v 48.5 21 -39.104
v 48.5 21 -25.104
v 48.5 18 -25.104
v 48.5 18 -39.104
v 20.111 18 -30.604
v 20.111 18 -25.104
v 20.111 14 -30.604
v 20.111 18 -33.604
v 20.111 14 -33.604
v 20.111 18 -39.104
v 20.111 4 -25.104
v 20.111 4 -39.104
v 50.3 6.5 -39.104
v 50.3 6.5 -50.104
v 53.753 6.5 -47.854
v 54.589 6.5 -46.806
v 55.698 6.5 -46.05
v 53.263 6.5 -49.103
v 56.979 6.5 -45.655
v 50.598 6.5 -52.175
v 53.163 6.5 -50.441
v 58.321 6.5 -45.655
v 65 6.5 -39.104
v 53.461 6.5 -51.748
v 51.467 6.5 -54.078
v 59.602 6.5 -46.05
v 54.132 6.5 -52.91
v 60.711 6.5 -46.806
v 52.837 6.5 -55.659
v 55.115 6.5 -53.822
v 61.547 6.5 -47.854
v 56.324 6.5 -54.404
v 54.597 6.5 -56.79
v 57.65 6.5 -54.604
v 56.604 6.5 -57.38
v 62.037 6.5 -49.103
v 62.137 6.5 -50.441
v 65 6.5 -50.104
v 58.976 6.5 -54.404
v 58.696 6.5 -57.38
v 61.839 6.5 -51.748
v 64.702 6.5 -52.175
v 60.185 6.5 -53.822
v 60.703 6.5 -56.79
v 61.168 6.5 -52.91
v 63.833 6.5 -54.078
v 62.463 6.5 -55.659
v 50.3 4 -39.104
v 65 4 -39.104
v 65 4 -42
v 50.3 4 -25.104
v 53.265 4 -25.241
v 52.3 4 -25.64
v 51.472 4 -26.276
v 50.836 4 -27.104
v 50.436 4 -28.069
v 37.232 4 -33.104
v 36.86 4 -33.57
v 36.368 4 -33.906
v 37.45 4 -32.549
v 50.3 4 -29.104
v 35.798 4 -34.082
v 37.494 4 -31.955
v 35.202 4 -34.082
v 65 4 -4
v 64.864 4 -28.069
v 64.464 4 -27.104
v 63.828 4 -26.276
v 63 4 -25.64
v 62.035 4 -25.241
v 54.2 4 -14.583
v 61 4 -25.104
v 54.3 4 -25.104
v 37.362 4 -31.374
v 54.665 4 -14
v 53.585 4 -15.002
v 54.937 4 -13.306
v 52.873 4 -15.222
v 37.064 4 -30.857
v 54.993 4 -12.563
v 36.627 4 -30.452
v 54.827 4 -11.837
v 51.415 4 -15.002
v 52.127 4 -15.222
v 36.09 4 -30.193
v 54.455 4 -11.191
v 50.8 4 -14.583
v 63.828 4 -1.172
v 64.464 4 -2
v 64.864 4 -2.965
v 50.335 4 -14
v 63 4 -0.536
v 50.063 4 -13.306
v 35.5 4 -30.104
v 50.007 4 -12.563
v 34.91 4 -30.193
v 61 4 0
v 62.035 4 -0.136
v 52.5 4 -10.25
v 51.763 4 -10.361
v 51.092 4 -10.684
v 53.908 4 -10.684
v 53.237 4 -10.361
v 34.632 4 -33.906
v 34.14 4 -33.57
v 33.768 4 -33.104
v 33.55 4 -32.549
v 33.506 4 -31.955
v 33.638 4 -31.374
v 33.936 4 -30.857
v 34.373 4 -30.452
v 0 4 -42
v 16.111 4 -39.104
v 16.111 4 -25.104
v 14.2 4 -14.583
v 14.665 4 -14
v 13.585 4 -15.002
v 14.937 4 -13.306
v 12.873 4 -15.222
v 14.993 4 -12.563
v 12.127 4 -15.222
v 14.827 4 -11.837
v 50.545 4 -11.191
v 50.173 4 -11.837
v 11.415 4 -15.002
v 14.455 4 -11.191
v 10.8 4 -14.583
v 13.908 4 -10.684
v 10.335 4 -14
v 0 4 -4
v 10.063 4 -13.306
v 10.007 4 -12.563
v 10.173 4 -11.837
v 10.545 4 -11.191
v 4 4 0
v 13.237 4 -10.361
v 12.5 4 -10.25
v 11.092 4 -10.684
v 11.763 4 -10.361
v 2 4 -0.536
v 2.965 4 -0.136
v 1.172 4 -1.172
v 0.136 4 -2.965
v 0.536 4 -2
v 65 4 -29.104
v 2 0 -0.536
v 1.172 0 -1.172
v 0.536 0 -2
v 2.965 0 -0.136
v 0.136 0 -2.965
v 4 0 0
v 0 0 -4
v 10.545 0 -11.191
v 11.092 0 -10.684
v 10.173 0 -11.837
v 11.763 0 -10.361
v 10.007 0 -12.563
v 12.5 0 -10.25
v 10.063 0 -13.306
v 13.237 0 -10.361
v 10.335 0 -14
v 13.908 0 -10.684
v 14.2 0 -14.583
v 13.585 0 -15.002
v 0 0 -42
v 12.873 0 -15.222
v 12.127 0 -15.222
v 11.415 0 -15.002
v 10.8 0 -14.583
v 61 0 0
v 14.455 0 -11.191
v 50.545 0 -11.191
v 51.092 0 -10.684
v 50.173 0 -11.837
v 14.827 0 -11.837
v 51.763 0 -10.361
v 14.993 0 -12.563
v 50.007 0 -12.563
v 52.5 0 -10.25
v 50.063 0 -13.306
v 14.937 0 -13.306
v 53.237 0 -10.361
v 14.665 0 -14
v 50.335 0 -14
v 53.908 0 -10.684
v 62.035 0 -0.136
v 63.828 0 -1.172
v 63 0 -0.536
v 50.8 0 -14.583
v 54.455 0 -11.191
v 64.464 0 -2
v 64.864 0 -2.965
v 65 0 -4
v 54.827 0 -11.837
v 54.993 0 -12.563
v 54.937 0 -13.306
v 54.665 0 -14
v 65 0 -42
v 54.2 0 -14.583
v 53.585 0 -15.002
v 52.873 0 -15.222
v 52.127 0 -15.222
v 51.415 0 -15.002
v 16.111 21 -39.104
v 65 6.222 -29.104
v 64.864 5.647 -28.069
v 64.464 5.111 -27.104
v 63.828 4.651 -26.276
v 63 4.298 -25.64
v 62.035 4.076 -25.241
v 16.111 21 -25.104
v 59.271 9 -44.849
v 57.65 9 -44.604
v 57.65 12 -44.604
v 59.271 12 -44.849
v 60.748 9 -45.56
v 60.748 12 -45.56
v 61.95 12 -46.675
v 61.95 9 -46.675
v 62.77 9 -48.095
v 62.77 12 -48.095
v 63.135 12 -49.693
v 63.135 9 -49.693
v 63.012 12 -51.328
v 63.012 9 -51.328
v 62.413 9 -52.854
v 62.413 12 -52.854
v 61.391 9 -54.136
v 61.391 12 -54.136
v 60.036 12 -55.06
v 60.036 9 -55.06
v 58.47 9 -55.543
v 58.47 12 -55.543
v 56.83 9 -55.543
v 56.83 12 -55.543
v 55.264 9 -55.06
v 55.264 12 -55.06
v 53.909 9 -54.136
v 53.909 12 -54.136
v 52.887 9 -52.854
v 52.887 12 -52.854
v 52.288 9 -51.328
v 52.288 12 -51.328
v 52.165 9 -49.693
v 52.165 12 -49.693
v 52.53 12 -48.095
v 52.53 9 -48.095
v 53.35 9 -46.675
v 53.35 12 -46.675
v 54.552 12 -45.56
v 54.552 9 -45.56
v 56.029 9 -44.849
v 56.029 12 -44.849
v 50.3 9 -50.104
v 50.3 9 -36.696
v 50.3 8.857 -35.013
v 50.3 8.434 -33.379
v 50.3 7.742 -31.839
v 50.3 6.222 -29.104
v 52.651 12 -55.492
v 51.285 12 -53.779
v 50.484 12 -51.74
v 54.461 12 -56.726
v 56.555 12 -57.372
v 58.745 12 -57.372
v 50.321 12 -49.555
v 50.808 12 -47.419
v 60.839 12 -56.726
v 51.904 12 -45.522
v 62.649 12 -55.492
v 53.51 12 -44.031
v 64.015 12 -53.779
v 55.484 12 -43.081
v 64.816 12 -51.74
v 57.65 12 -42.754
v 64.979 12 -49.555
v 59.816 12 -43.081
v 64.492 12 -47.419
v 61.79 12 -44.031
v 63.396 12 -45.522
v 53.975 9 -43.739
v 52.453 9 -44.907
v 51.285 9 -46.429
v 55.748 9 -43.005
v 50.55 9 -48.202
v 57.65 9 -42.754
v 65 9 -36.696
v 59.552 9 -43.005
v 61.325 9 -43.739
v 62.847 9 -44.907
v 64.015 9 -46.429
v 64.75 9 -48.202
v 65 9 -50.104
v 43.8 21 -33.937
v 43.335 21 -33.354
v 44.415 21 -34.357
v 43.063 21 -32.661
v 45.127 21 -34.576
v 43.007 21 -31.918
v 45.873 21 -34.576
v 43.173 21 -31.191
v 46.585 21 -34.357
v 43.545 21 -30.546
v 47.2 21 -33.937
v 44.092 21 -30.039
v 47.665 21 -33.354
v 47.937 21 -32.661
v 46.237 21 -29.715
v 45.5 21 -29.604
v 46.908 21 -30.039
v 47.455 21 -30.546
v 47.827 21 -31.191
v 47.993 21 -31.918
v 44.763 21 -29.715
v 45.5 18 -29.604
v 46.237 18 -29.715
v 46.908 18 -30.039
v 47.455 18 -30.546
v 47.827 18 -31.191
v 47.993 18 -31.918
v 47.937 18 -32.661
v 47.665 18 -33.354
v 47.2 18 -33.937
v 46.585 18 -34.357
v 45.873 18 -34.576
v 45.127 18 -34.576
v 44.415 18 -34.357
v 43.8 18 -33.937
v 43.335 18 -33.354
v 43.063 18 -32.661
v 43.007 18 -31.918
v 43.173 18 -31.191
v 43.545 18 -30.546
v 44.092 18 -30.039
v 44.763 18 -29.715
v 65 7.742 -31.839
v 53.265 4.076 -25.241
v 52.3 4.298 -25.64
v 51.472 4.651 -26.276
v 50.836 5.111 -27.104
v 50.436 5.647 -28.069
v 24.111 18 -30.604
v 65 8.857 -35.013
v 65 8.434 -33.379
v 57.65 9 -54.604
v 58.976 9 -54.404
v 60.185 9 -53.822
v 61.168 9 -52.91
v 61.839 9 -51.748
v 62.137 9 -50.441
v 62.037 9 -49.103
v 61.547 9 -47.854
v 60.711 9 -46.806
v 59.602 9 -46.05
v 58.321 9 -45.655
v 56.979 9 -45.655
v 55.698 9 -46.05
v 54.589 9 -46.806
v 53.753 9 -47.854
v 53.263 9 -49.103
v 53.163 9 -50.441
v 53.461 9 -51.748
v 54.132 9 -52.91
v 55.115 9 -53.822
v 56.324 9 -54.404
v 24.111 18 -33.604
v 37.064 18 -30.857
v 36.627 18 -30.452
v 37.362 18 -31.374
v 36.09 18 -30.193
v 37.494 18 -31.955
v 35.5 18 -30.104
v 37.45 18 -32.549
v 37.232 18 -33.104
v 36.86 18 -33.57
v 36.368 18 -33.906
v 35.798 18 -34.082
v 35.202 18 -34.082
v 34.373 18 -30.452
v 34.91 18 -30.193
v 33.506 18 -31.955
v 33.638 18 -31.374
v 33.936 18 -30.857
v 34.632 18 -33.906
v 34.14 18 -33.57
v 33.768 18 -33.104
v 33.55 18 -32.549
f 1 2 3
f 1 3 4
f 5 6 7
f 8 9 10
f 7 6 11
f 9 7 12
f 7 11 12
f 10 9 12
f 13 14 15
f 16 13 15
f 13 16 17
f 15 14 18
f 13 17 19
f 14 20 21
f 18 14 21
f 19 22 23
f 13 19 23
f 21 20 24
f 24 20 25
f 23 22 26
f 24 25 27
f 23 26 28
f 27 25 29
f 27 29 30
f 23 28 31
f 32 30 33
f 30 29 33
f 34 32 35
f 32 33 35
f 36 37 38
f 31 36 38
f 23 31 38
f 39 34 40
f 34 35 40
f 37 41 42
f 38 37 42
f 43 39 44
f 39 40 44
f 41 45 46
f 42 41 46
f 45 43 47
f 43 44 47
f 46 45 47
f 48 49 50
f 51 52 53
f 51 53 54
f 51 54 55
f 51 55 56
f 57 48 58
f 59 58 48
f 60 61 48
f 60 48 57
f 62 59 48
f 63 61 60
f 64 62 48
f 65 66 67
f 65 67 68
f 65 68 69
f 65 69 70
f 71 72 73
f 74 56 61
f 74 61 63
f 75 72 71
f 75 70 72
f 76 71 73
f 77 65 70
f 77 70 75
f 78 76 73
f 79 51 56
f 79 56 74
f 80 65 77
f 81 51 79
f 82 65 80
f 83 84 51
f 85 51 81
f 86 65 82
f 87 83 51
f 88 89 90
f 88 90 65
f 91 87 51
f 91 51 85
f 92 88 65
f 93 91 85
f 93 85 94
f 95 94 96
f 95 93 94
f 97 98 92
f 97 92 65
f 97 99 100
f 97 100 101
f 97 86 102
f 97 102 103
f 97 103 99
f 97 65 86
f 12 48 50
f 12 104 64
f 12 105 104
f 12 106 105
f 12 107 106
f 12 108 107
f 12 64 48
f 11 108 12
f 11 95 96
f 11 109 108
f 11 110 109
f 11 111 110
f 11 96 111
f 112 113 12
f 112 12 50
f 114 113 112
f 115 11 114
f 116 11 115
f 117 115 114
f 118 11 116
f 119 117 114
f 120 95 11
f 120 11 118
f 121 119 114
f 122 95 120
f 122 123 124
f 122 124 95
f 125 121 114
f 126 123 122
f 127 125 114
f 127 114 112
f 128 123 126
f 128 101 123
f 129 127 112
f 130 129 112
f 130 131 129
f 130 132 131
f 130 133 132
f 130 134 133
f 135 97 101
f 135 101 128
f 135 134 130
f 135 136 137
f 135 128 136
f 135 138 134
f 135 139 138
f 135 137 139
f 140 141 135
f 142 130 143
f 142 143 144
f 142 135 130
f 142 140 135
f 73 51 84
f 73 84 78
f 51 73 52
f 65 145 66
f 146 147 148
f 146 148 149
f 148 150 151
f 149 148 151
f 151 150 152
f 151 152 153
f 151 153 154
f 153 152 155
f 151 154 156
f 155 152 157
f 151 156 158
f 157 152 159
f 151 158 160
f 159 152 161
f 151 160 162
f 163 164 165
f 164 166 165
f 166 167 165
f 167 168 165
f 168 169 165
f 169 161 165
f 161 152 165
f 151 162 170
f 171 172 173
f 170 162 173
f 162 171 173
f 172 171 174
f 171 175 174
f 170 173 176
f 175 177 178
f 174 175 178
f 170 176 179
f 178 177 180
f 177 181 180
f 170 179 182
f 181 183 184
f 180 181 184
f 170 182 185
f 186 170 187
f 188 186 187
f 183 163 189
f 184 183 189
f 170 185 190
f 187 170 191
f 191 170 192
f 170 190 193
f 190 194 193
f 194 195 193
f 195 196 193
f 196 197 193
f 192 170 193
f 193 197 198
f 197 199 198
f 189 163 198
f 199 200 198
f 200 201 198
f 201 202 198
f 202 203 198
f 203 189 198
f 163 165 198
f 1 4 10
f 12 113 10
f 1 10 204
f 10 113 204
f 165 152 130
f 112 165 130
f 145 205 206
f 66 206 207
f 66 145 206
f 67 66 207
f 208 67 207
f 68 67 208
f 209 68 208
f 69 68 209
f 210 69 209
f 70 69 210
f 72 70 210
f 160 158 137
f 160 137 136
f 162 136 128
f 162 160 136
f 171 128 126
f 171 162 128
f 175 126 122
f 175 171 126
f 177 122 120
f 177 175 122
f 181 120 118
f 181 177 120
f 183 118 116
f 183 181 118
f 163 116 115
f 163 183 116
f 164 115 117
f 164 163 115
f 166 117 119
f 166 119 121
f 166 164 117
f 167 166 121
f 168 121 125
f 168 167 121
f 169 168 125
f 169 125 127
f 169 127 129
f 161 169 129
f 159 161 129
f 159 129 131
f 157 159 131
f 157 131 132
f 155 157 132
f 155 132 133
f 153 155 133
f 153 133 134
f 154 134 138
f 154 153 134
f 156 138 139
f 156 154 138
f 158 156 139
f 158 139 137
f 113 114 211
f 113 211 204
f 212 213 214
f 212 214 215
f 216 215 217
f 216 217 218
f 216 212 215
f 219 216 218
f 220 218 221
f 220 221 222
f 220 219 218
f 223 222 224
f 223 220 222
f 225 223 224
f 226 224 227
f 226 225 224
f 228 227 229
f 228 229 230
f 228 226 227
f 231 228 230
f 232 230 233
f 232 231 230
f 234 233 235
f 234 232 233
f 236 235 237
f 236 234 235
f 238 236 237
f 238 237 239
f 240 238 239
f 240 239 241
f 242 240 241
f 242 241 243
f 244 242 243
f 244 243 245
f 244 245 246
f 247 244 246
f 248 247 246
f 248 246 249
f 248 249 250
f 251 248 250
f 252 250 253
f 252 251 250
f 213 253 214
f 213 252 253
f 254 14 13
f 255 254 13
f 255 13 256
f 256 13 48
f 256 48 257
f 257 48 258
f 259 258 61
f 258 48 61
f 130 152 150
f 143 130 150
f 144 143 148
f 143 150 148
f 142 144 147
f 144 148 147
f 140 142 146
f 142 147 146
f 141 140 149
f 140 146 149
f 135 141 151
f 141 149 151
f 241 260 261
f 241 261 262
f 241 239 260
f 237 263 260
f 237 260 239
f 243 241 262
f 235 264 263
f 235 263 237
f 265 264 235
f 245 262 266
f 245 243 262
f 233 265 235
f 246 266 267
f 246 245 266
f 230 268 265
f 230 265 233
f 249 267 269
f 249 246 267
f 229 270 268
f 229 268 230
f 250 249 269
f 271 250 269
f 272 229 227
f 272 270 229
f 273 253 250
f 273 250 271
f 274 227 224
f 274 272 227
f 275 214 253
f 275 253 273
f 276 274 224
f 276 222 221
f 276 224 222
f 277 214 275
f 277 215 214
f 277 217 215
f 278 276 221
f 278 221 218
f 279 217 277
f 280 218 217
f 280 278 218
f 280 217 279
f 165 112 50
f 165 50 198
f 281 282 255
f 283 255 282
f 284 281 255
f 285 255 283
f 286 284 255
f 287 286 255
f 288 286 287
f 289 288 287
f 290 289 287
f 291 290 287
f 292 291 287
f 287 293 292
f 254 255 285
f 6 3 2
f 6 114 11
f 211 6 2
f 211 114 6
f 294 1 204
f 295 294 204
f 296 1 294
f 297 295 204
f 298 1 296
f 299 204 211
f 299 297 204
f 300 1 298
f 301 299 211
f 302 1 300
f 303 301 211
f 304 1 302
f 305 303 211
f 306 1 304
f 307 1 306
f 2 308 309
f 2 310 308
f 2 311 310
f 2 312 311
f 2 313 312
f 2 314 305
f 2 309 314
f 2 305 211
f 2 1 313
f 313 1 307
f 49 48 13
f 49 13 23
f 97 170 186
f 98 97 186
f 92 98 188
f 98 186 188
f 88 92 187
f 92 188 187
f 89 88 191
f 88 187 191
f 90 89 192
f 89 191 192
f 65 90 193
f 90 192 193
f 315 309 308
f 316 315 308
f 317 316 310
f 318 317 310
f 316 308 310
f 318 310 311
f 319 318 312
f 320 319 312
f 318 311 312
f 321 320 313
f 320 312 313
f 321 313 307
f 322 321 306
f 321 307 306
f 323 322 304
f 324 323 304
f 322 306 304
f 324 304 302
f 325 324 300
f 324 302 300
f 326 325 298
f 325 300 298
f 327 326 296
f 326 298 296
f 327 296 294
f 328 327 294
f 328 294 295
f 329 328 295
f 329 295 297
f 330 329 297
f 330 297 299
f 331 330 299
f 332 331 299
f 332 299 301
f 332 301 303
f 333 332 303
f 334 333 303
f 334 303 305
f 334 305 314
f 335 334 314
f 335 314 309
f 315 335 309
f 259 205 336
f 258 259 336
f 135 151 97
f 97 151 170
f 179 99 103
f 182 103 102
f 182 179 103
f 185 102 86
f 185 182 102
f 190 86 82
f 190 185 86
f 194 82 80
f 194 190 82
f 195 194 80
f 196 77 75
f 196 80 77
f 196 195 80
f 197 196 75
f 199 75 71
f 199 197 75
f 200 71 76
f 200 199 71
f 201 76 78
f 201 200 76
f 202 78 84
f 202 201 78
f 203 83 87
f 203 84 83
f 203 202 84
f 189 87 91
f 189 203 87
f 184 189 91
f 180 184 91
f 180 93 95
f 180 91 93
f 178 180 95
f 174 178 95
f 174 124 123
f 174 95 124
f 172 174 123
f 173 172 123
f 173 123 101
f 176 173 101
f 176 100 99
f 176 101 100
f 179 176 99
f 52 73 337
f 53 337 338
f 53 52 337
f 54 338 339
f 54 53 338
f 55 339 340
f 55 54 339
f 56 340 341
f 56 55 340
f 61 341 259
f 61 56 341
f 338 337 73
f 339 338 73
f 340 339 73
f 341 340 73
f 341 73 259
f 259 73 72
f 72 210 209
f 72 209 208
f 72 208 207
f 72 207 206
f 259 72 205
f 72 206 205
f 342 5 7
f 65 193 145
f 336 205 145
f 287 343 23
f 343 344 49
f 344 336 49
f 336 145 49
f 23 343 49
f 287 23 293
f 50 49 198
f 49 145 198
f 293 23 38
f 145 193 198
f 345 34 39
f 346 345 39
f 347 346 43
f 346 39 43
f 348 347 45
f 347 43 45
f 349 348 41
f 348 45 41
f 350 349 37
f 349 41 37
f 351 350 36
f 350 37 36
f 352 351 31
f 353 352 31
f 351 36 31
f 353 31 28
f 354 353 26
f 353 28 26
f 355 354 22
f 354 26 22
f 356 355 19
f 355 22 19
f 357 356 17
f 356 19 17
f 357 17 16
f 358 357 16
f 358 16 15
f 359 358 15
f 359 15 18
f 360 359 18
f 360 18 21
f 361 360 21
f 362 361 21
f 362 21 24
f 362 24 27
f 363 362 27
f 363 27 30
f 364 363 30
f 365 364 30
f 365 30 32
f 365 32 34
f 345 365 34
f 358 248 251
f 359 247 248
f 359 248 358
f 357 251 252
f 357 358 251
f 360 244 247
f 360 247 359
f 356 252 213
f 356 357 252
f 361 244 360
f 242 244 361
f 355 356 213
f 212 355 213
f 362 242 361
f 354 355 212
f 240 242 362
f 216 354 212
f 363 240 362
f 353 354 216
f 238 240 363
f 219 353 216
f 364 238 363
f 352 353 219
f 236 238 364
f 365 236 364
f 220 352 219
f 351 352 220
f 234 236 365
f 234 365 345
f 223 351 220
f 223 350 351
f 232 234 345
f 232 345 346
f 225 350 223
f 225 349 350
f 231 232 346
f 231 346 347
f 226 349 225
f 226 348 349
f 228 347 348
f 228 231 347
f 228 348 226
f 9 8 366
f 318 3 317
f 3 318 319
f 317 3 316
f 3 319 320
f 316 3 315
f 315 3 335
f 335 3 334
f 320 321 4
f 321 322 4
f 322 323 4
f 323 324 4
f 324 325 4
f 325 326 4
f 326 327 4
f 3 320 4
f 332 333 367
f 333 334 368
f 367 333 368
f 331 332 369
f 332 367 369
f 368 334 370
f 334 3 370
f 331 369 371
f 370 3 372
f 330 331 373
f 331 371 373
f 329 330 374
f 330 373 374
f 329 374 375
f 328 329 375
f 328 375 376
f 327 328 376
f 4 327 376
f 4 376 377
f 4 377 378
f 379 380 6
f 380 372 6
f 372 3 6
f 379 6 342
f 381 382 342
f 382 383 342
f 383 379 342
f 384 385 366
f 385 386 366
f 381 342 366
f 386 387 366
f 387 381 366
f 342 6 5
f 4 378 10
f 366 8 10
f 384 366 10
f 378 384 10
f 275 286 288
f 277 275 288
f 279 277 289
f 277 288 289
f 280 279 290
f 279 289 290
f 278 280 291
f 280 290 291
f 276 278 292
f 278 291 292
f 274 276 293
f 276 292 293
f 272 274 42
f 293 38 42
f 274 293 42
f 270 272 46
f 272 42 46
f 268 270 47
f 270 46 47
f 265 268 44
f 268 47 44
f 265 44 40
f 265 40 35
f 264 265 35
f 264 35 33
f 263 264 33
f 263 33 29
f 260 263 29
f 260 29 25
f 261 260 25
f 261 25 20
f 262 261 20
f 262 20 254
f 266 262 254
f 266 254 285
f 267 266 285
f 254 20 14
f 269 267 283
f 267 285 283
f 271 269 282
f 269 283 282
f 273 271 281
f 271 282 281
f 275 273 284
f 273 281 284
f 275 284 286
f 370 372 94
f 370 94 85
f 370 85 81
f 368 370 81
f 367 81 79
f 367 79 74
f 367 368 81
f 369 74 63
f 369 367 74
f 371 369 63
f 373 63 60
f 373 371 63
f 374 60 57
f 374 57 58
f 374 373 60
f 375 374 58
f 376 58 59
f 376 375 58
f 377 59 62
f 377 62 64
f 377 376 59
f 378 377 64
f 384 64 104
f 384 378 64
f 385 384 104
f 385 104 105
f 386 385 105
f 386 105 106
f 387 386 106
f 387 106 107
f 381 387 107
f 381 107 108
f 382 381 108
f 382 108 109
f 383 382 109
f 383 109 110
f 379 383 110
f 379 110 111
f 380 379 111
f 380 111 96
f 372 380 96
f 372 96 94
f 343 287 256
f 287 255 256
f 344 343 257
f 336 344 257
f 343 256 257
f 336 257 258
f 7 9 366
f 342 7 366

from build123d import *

# Parameters (mm, degrees)
SKETCH1_R                = 2.5
BOSS_EXTRUDE1_DEPTH      = 4
SKETCH2_R                = 2
SKETCH2_W                = 65
SKETCH2_H                = 4
BOSS_EXTRUDE2_DEPTH      = 13
BOSS_EXTRUDE3_DEPTH      = 4
SKETCH4_W                = 65
SKETCH4_H                = 4
BOSS_EXTRUDE4_DEPTH      = 20
FILLET1_R                = 4
SKETCH6_R                = 2.5
CUT_EXTRUDE1_DEPTH       = 20
SKETCH7_W                = 46
SKETCH7_H                = 4
CUT_EXTRUDE2_DEPTH       = 80
BOSS_EXTRUDE6_DEPTH      = 2.5
BOSS_EXTRUDE6_DEPTH_BACK = 2.5
CUT_EXTRUDE3_REACH       = 94.25
FILLET2_R                = 4
BOSS_EXTRUDE5_START      = 5
SKETCH8_R                = 6
SKETCH8_R_2              = 2.5
BOSS_EXTRUDE5_DEPTH      = 5
FILLET3_R                = 4
BOSS_EXTRUDE7_START      = 4
BOSS_EXTRUDE7_DEPTH      = 3.5
SKETCH13_R               = 4.5
CUT_EXTRUDE4_DEPTH       = 6
SKETCH14_W               = 13.282344927
SKETCH14_H               = 18
CUT_EXTRUDE5_DEPTH       = 6
FILLET5_R                = 4
SKETCH15_W               = 65
SKETCH15_H               = 4
BOSS_EXTRUDE8_DEPTH      = 20
SKETCH16_R               = 2.5
CUT_EXTRUDE6_DEPTH       = 30
SKETCH18_W               = 5.451877136
SKETCH18_H               = 11.015996258
BOSS_EXTRUDE9_DEPTH      = 17
CUT_EXTRUDE7_START       = -3.235556
SKETCH19_W               = 62
SKETCH19_H               = 17
CUT_EXTRUDE7_DEPTH       = 10.735556
BOSS_EXTRUDE10_START     = 5
SKETCH20_R               = 4
SKETCH20_R_2             = 2.5
BOSS_EXTRUDE10_DEPTH     = 5
SKETCH21_W               = 4
SKETCH21_H               = 14
BOSS_EXTRUDE11_DEPTH     = 17
SKETCH22_W               = 14
SKETCH22_H               = 3
BOSS_EXTRUDE12_DEPTH     = 37.388836628
CUT_EXTRUDE8_START       = 12
SKETCH24_R               = 2.5
CUT_EXTRUDE8_DEPTH       = 12
SKETCH25_W               = 11.015996258
SKETCH25_H               = 17
CUT_EXTRUDE9_DEPTH       = 5.451877136
SKETCH26_R               = 6
CUT_EXTRUDE10_DEPTH      = 5
BOSS_EXTRUDE13_START     = -4
SKETCH27_R               = 4.5
BOSS_EXTRUDE13_DEPTH     = 4
BOSS_EXTRUDE14_DEPTH     = 5
CUT_EXTRUDE11_DEPTH      = 14.7
FILLET6_R                = 10
BOSS_EXTRUDE15_START     = -2.5
SKETCH32_R               = 4
BOSS_EXTRUDE15_DEPTH     = 2.5
SKETCH28_W               = 20
SKETCH28_H               = 4
CUT_EXTRUDE12_DEPTH      = 65
SKETCH33_W               = 9
SKETCH33_H               = 14
CUT_EXTRUDE13_DEPTH      = 3
BOSS_EXTRUDE18_START     = -8.5
BOSS_EXTRUDE18_DEPTH     = 3
SKETCH35_R               = 2
BOSS_EXTRUDE19_DEPTH     = 17
SKETCH37_R               = 7.35
SKETCH37_R_2             = 5.5
BOSS_EXTRUDE20_DEPTH     = 3
SKETCH38_R               = 4.5
CUT_EXTRUDE14_DEPTH      = 3


with BuildPart() as part:
    # Sketch1 → Boss-Extrude1 (new body)
    with BuildSketch(Plane(origin=(0, 0, 0), x_dir=(1, 0, 0), z_dir=(0, 1, 0))):
        with BuildLine():
            Line((4, 0), (61, 0))
            ThreePointArc((61, 0), (63.828427125, 1.171572875), (65, 4))
            Line((65, 4), (65, 42))
            Line((65, 42), (0, 42))
            Line((0, 42), (0, 4))
            ThreePointArc((0, 4), (1.171572875, 1.171572875), (4, 0))
        make_face()
        with Locations(Location((12.5, 12.75, 0), (0, 0, 270))):
            Circle(SKETCH1_R, mode=Mode.SUBTRACT)
        with Locations(Location((52.5, 12.75, 0), (0, 0, 270))):
            Circle(SKETCH1_R, mode=Mode.SUBTRACT)
    extrude(amount=BOSS_EXTRUDE1_DEPTH)

    # Sketch2 → Boss-Extrude2 (add)
    with BuildSketch(Plane(origin=(0, 4, 0), x_dir=(1, 0, 0), z_dir=(0, 1, 0))):
        with Locations(Location((61, 4, 0), (0, 0, 90))):
            Circle(SKETCH2_R)
        with Locations(Location((4, 4, 0), (0, 0, 90))):
            Circle(SKETCH2_R)
        with Locations((32.5, 40)):
            Rectangle(SKETCH2_W, SKETCH2_H)
    extrude(amount=BOSS_EXTRUDE2_DEPTH)

    # Sketch3 → Boss-Extrude3 (add)
    with BuildSketch(Plane(origin=(0, 17, 0), x_dir=(1, 0, 0), z_dir=(0, 1, 0))):
        with BuildLine():
            Line((0, 42), (65, 42))
            Line((65, 42), (65, 4))
            ThreePointArc((65, 4), (63.828427125, 1.171572875), (61, 0))
            Line((61, 0), (4, 0))
            ThreePointArc((4, 0), (1.171572875, 1.171572875), (0, 4))
            Line((0, 4), (0, 42))
        make_face()
    extrude(amount=BOSS_EXTRUDE3_DEPTH)

    # Sketch4 → Boss-Extrude4 (add)
    with BuildSketch(Plane(origin=(0, 0, -42), x_dir=(-1, 0, 0), z_dir=(0, 0, -1))):
        with Locations((-32.5, 19)):
            Rectangle(SKETCH4_W, SKETCH4_H)
    extrude(amount=BOSS_EXTRUDE4_DEPTH)

    # Fillet1
    fillet1_edges = [part.edges().sort_by_distance(p)[0] for p in [
        (65, 19, -62),
        (0, 19, -62),
    ]]
    fillet(fillet1_edges, radius=FILLET1_R)

    # Sketch6 → Cut-Extrude1 (cut)
    with BuildSketch(Plane(origin=(0, 21, 0), x_dir=(1, 0, 0), z_dir=(0, 1, 0))):
        with Locations(Location((57.65, 50.10433299, 0), (0, 0, 270))):
            Circle(SKETCH6_R)
        with Locations(Location((45.5, 32.10433299, 0), (0, 0, 270))):
            Circle(SKETCH6_R)
    extrude(amount=-CUT_EXTRUDE1_DEPTH, mode=Mode.SUBTRACT)

    # Sketch7 → Cut-Extrude2 (cut)
    with BuildSketch(Plane.XY):
        Polygon((4, 17), (4, 21), (0, 21), (0, 4), (50, 4), (50, 17), align=None)
        with Locations((27, 19)):
            Rectangle(SKETCH7_W, SKETCH7_H)
    extrude(amount=-CUT_EXTRUDE2_DEPTH, mode=Mode.SUBTRACT)

    # Sketch10 → Boss-Extrude6 (add, two sides: drawn at the far end of the back side and taken through both)
    with BuildSketch(Plane(origin=(57.5, 0, 0), x_dir=(0, 0, -1), z_dir=(1, 0, 0)).offset(-BOSS_EXTRUDE6_DEPTH_BACK)):
        Polygon((33, 4), (38, 9), (38, 4), align=None)
    extrude(amount=BOSS_EXTRUDE6_DEPTH + BOSS_EXTRUDE6_DEPTH_BACK)

    # Cut-Extrude3: up to this face of the body (flat: up to its plane)
    cut_extrude3_end = Plane(part.part.faces().sort_by_distance((31.433090337, 4, -20.592914262))[0])
    # Sketch11 → Cut-Extrude3 (cut, up to the picked face)
    with BuildSketch(Plane(origin=(0, 21, 0), x_dir=(1, 0, 0), z_dir=(0, 1, 0)), mode=Mode.PRIVATE) as cut_extrude3_sk1:
        with BuildLine():
            Line((57.5, 0), (57.5, 42))
            ThreePointArc((57.5, 42), (56.914213562, 43.414213562), (55.5, 44))
            Line((55.5, 44), (50, 44))
            Line((50, 44), (50, 0))
            Line((50, 0), (57.5, 0))
        make_face()
    cut_extrude3_tool1 = split(extrude(cut_extrude3_sk1.sketch, amount=-CUT_EXTRUDE3_REACH, mode=Mode.PRIVATE), bisect_by=cut_extrude3_end, keep=Keep.BOTH, mode=Mode.PRIVATE)
    add(cut_extrude3_tool1.solids().sort_by(Axis((53.741385, 21, -21.943789), (0, -1, 0)))[0], mode=Mode.SUBTRACT)

    # Fillet2
    # the kernel refuses this fillet: 4 mm, written as the material it takes off along each edge
    with BuildSketch(Plane(origin=(57.5, 30.921567416, 0), x_dir=(1, 0, 0), z_dir=(0, -1, 0))) as fillet2_piece_1:
        with BuildLine():
            CenterArc((4, -3.968626967), FILLET2_R, 97.180755781, 82.819244219)
            Line((0, -3.968626967), (-0.08, -3.968626967))
            Line((-0.08, -3.968626967), (-0.08, 0))
            Line((-0.08, 0), (0, 0.08))
            ThreePointArc((0, 0.08), (1.75, 0.08), (3.49, 0.079372539))
            Line((3.49, 0.079372539), (3.5, 0))
        make_face()
    extrude(amount=23.843134833, mode=Mode.SUBTRACT)

    # Sketch8 → Boss-Extrude5 (add)
    with BuildSketch(Plane(origin=(0, 4, 0), x_dir=(1, 0, 0), z_dir=(0, 1, 0)).offset(BOSS_EXTRUDE5_START)):
        with Locations(Location((45.5, 32.10433299, 0), (0, 0, 270))):
            Circle(SKETCH8_R)
        with Locations(Location((45.5, 32.10433299, 0), (0, 0, 270))):
            Circle(SKETCH8_R_2, mode=Mode.SUBTRACT)
    extrude(amount=-BOSS_EXTRUDE5_DEPTH)

    # Fillet3
    fillet3_edges = [part.edges().sort_by_distance(p)[0] for p in [
        (50, 19, -62),
    ]]
    fillet(fillet3_edges, radius=FILLET3_R)

    # Sketch12 → Boss-Extrude7 (add)
    with BuildSketch(Plane(origin=(57.5, 0, 0), x_dir=(0, 0, -1), z_dir=(1, 0, 0)).offset(BOSS_EXTRUDE7_START)):
        Polygon((42, 12), (47, 17), (42, 17), align=None)
    extrude(amount=BOSS_EXTRUDE7_DEPTH)

    # Sketch13 → Cut-Extrude4 (cut)
    with BuildSketch(Plane.XZ):
        with Locations(Location((45.5, -32.10433299, 0), (0, 0, 270))):
            Circle(SKETCH13_R)
    extrude(amount=-CUT_EXTRUDE4_DEPTH, mode=Mode.SUBTRACT)

    # Sketch14 → Cut-Extrude5 (cut)
    with BuildSketch(Plane(origin=(0, 21, 0), x_dir=(1, 0, 0), z_dir=(0, 1, 0))):
        with Locations((47.623272126, 53)):
            Rectangle(SKETCH14_W, SKETCH14_H)
    extrude(amount=-CUT_EXTRUDE5_DEPTH, mode=Mode.SUBTRACT)

    # Fillet5
    fillet5_edges = [part.edges().sort_by_distance(p)[0] for p in [
        (54.264444589, 19, -62),
        (54.264444589, 19, -44),
    ]]
    fillet(fillet5_edges, radius=FILLET5_R)

    # Sketch15 → Boss-Extrude8 (add)
    with BuildSketch(Plane(origin=(0, 0, -42), x_dir=(-1, 0, 0), z_dir=(0, 0, -1))):
        with Locations((-32.5, 2)):
            Rectangle(SKETCH15_W, SKETCH15_H)
    extrude(amount=BOSS_EXTRUDE8_DEPTH)

    # Sketch16 → Cut-Extrude6 (cut)
    with BuildSketch(Plane(origin=(0, 21, 0), x_dir=(1, 0, 0), z_dir=(0, 1, 0))):
        with Locations(Location((57.65, 50.10433299, 0), (0, 0, 270))):
            Circle(SKETCH16_R)
    extrude(amount=-CUT_EXTRUDE6_DEPTH, mode=Mode.SUBTRACT)

    # Sketch18 → Boss-Extrude9 (add)
    with BuildSketch(Plane(origin=(0, 4, 0), x_dir=(1, 0, 0), z_dir=(0, 1, 0))):
        with Locations((32.967615748, 5.507998129)):
            Rectangle(SKETCH18_W, SKETCH18_H)
    extrude(amount=BOSS_EXTRUDE9_DEPTH)

    # Sketch19 → Cut-Extrude7 (cut)
    with BuildSketch(Plane(origin=(57.5, 0, 0), x_dir=(0, 0, -1), z_dir=(1, 0, 0)).offset(CUT_EXTRUDE7_START)):
        with Locations((31, 12.5)):
            Rectangle(SKETCH19_W, SKETCH19_H)
    extrude(amount=CUT_EXTRUDE7_DEPTH, mode=Mode.SUBTRACT)

    # Sketch20 → Boss-Extrude10 (add)
    with BuildSketch(Plane(origin=(0, 4, 0), x_dir=(1, 0, 0), z_dir=(0, 1, 0)).offset(BOSS_EXTRUDE10_START)):
        with Locations(Location((57.65, 50.10433299, 0), (0, 0, 270))):
            Circle(SKETCH20_R)
        with Locations(Location((57.65, 50.10433299, 0), (0, 0, 270))):
            Circle(SKETCH20_R_2, mode=Mode.SUBTRACT)
    extrude(amount=-BOSS_EXTRUDE10_DEPTH)

    # Sketch21 → Boss-Extrude11 (add)
    with BuildSketch(Plane(origin=(0, 4, 0), x_dir=(1, 0, 0), z_dir=(0, 1, 0))):
        with Locations((18.111163372, 32.10433299)):
            Rectangle(SKETCH21_W, SKETCH21_H)
    extrude(amount=BOSS_EXTRUDE11_DEPTH)

    # Sketch22 → Boss-Extrude12 (add)
    with BuildSketch(Plane(origin=(20.111163372, 0, 0), x_dir=(0, 0, -1), z_dir=(1, 0, 0))):
        with Locations((32.10433299, 19.5)):
            Rectangle(SKETCH22_W, SKETCH22_H)
    extrude(amount=BOSS_EXTRUDE12_DEPTH)

    # Sketch24 → Cut-Extrude8 (cut)
    with BuildSketch(Plane(origin=(0, 9, 0), x_dir=(1, 0, 0), z_dir=(0, 1, 0)).offset(CUT_EXTRUDE8_START)):
        with Locations(Location((45.5, 32.10433299, 0), (0, 0, 270))):
            Circle(SKETCH24_R)
    extrude(amount=-CUT_EXTRUDE8_DEPTH, mode=Mode.SUBTRACT)

    # Sketch25 → Cut-Extrude9 (cut)
    with BuildSketch(Plane(origin=(35.693554316, 0, 0), x_dir=(0, 0, -1), z_dir=(1, 0, 0))):
        with Locations((5.507998129, 12.5)):
            Rectangle(SKETCH25_W, SKETCH25_H)
    extrude(amount=-CUT_EXTRUDE9_DEPTH, mode=Mode.SUBTRACT)

    # Sketch26 → Cut-Extrude10 (cut)
    with BuildSketch(Plane(origin=(0, 9, 0), x_dir=(1, 0, 0), z_dir=(0, 1, 0))):
        with Locations((45.5, 32.10433299)):
            Circle(SKETCH26_R)
    extrude(amount=-CUT_EXTRUDE10_DEPTH, mode=Mode.SUBTRACT)

    # Sketch27 → Boss-Extrude13 (add)
    with BuildSketch(Plane(origin=(0, 4, 0), x_dir=(1, 0, 0), z_dir=(0, 1, 0)).offset(BOSS_EXTRUDE13_START)):
        with Locations((45.5, 32.10433299)):
            Circle(SKETCH27_R)
    extrude(amount=BOSS_EXTRUDE13_DEPTH)

    # Sketch29 → Boss-Extrude14 (add)
    with BuildSketch(Plane(origin=(0, 4, 0), x_dir=(1, 0, 0), z_dir=(0, 1, 0))):
        with BuildLine():
            Line((61, 25.10433299), (54.3, 25.10433299))
            ThreePointArc((54.3, 25.10433299), (51.471572875, 26.275905866), (50.3, 29.10433299))
            Line((50.3, 29.10433299), (50.3, 39.10433299))
            Line((50.3, 39.10433299), (65, 39.10433299))
            Line((65, 39.10433299), (65, 29.10433299))
            ThreePointArc((65, 29.10433299), (63.828427125, 26.275905866), (61, 25.10433299))
        make_face()
    extrude(amount=BOSS_EXTRUDE14_DEPTH)

    # Sketch31 → Cut-Extrude11 (cut)
    with BuildSketch(Plane(origin=(65, 0, 0), x_dir=(0, 0, -1), z_dir=(1, 0, 0))):
        Polygon((25.10433299, 9), (25.10433299, 4), (29.10433299, 6.222222222), (29.10433299, 9), align=None)
        Polygon((29.10433299, 9), (29.10433299, 6.222222222), (34.10433299, 9), align=None)
    extrude(amount=-CUT_EXTRUDE11_DEPTH, mode=Mode.SUBTRACT)

    # Fillet6
    fillet6_edges = [part.edges().sort_by_distance(p)[0] for p in [
        (57.65, 9, -34.10433299),
    ]]
    fillet(fillet6_edges, radius=FILLET6_R)

    # Sketch32 → Boss-Extrude15 (add)
    with BuildSketch(Plane(origin=(0, 9, 0), x_dir=(1, 0, 0), z_dir=(0, 1, 0)).offset(BOSS_EXTRUDE15_START)):
        with BuildLine():
            Line((65, 39.10433299), (65, 50.10433299))
            ThreePointArc((65, 50.10433299), (57.65, 57.45433299), (50.3, 50.10433299))
            Line((50.3, 50.10433299), (50.3, 39.10433299))
            Line((50.3, 39.10433299), (65, 39.10433299))
        make_face()
        with Locations(Location((57.65, 50.10433299, 0), (0, 0, 270))):
            Circle(SKETCH32_R, mode=Mode.SUBTRACT)
    extrude(amount=BOSS_EXTRUDE15_DEPTH)

    # Sketch28 → Cut-Extrude12 (cut)
    with BuildSketch(Plane(origin=(65, 0, 0), x_dir=(0, 0, -1), z_dir=(1, 0, 0))):
        Polygon((42, 4), (62, 4), (62, 6.5), (50.10433299, 6.5), (42, 6.5), align=None)
        with Locations((52, 2)):
            Rectangle(SKETCH28_W, SKETCH28_H)
    extrude(amount=-CUT_EXTRUDE12_DEPTH, mode=Mode.SUBTRACT)

    # Sketch33 → Cut-Extrude13 (cut)
    with BuildSketch(Plane(origin=(0, 21, 0), x_dir=(1, 0, 0), z_dir=(0, 1, 0))):
        with Locations((53, 32.10433299)):
            Rectangle(SKETCH33_W, SKETCH33_H)
    extrude(amount=-CUT_EXTRUDE13_DEPTH, mode=Mode.SUBTRACT)

    # Sketch34 → Boss-Extrude18 (add)
    with BuildSketch(Plane.XY.offset(-25.10433299).offset(BOSS_EXTRUDE18_START)):
        Polygon((20.111163372, 14), (24.111163372, 18), (20.111163372, 18), align=None)
    extrude(amount=BOSS_EXTRUDE18_DEPTH)

    # Sketch35 → Boss-Extrude19 (add)
    with BuildSketch(Plane(origin=(0, 21, 0), x_dir=(1, 0, 0), z_dir=(0, 1, 0))):
        with Locations(Location((35.5, 32.10433299, 0), (0, 0, 270))):
            Circle(SKETCH35_R)
    extrude(amount=-BOSS_EXTRUDE19_DEPTH)

    # Sketch37 → Boss-Extrude20 (add)
    with BuildSketch(Plane(origin=(0, 9, 0), x_dir=(1, 0, 0), z_dir=(0, 1, 0))):
        with Locations(Location((57.65, 50.10433299, 0), (0, 0, 270))):
            Circle(SKETCH37_R)
        with Locations(Location((57.65, 50.10433299, 0), (0, 0, 270))):
            Circle(SKETCH37_R_2, mode=Mode.SUBTRACT)
    extrude(amount=BOSS_EXTRUDE20_DEPTH)

    # Sketch38 → Cut-Extrude14 (cut)
    with BuildSketch(Plane.XZ.offset(-6.5)):
        with Locations(Location((57.65, -50.10433299, 0), (0, 0, 270))):
            Circle(SKETCH38_R)
    extrude(amount=-CUT_EXTRUDE14_DEPTH, mode=Mode.SUBTRACT)


solid = part.part
